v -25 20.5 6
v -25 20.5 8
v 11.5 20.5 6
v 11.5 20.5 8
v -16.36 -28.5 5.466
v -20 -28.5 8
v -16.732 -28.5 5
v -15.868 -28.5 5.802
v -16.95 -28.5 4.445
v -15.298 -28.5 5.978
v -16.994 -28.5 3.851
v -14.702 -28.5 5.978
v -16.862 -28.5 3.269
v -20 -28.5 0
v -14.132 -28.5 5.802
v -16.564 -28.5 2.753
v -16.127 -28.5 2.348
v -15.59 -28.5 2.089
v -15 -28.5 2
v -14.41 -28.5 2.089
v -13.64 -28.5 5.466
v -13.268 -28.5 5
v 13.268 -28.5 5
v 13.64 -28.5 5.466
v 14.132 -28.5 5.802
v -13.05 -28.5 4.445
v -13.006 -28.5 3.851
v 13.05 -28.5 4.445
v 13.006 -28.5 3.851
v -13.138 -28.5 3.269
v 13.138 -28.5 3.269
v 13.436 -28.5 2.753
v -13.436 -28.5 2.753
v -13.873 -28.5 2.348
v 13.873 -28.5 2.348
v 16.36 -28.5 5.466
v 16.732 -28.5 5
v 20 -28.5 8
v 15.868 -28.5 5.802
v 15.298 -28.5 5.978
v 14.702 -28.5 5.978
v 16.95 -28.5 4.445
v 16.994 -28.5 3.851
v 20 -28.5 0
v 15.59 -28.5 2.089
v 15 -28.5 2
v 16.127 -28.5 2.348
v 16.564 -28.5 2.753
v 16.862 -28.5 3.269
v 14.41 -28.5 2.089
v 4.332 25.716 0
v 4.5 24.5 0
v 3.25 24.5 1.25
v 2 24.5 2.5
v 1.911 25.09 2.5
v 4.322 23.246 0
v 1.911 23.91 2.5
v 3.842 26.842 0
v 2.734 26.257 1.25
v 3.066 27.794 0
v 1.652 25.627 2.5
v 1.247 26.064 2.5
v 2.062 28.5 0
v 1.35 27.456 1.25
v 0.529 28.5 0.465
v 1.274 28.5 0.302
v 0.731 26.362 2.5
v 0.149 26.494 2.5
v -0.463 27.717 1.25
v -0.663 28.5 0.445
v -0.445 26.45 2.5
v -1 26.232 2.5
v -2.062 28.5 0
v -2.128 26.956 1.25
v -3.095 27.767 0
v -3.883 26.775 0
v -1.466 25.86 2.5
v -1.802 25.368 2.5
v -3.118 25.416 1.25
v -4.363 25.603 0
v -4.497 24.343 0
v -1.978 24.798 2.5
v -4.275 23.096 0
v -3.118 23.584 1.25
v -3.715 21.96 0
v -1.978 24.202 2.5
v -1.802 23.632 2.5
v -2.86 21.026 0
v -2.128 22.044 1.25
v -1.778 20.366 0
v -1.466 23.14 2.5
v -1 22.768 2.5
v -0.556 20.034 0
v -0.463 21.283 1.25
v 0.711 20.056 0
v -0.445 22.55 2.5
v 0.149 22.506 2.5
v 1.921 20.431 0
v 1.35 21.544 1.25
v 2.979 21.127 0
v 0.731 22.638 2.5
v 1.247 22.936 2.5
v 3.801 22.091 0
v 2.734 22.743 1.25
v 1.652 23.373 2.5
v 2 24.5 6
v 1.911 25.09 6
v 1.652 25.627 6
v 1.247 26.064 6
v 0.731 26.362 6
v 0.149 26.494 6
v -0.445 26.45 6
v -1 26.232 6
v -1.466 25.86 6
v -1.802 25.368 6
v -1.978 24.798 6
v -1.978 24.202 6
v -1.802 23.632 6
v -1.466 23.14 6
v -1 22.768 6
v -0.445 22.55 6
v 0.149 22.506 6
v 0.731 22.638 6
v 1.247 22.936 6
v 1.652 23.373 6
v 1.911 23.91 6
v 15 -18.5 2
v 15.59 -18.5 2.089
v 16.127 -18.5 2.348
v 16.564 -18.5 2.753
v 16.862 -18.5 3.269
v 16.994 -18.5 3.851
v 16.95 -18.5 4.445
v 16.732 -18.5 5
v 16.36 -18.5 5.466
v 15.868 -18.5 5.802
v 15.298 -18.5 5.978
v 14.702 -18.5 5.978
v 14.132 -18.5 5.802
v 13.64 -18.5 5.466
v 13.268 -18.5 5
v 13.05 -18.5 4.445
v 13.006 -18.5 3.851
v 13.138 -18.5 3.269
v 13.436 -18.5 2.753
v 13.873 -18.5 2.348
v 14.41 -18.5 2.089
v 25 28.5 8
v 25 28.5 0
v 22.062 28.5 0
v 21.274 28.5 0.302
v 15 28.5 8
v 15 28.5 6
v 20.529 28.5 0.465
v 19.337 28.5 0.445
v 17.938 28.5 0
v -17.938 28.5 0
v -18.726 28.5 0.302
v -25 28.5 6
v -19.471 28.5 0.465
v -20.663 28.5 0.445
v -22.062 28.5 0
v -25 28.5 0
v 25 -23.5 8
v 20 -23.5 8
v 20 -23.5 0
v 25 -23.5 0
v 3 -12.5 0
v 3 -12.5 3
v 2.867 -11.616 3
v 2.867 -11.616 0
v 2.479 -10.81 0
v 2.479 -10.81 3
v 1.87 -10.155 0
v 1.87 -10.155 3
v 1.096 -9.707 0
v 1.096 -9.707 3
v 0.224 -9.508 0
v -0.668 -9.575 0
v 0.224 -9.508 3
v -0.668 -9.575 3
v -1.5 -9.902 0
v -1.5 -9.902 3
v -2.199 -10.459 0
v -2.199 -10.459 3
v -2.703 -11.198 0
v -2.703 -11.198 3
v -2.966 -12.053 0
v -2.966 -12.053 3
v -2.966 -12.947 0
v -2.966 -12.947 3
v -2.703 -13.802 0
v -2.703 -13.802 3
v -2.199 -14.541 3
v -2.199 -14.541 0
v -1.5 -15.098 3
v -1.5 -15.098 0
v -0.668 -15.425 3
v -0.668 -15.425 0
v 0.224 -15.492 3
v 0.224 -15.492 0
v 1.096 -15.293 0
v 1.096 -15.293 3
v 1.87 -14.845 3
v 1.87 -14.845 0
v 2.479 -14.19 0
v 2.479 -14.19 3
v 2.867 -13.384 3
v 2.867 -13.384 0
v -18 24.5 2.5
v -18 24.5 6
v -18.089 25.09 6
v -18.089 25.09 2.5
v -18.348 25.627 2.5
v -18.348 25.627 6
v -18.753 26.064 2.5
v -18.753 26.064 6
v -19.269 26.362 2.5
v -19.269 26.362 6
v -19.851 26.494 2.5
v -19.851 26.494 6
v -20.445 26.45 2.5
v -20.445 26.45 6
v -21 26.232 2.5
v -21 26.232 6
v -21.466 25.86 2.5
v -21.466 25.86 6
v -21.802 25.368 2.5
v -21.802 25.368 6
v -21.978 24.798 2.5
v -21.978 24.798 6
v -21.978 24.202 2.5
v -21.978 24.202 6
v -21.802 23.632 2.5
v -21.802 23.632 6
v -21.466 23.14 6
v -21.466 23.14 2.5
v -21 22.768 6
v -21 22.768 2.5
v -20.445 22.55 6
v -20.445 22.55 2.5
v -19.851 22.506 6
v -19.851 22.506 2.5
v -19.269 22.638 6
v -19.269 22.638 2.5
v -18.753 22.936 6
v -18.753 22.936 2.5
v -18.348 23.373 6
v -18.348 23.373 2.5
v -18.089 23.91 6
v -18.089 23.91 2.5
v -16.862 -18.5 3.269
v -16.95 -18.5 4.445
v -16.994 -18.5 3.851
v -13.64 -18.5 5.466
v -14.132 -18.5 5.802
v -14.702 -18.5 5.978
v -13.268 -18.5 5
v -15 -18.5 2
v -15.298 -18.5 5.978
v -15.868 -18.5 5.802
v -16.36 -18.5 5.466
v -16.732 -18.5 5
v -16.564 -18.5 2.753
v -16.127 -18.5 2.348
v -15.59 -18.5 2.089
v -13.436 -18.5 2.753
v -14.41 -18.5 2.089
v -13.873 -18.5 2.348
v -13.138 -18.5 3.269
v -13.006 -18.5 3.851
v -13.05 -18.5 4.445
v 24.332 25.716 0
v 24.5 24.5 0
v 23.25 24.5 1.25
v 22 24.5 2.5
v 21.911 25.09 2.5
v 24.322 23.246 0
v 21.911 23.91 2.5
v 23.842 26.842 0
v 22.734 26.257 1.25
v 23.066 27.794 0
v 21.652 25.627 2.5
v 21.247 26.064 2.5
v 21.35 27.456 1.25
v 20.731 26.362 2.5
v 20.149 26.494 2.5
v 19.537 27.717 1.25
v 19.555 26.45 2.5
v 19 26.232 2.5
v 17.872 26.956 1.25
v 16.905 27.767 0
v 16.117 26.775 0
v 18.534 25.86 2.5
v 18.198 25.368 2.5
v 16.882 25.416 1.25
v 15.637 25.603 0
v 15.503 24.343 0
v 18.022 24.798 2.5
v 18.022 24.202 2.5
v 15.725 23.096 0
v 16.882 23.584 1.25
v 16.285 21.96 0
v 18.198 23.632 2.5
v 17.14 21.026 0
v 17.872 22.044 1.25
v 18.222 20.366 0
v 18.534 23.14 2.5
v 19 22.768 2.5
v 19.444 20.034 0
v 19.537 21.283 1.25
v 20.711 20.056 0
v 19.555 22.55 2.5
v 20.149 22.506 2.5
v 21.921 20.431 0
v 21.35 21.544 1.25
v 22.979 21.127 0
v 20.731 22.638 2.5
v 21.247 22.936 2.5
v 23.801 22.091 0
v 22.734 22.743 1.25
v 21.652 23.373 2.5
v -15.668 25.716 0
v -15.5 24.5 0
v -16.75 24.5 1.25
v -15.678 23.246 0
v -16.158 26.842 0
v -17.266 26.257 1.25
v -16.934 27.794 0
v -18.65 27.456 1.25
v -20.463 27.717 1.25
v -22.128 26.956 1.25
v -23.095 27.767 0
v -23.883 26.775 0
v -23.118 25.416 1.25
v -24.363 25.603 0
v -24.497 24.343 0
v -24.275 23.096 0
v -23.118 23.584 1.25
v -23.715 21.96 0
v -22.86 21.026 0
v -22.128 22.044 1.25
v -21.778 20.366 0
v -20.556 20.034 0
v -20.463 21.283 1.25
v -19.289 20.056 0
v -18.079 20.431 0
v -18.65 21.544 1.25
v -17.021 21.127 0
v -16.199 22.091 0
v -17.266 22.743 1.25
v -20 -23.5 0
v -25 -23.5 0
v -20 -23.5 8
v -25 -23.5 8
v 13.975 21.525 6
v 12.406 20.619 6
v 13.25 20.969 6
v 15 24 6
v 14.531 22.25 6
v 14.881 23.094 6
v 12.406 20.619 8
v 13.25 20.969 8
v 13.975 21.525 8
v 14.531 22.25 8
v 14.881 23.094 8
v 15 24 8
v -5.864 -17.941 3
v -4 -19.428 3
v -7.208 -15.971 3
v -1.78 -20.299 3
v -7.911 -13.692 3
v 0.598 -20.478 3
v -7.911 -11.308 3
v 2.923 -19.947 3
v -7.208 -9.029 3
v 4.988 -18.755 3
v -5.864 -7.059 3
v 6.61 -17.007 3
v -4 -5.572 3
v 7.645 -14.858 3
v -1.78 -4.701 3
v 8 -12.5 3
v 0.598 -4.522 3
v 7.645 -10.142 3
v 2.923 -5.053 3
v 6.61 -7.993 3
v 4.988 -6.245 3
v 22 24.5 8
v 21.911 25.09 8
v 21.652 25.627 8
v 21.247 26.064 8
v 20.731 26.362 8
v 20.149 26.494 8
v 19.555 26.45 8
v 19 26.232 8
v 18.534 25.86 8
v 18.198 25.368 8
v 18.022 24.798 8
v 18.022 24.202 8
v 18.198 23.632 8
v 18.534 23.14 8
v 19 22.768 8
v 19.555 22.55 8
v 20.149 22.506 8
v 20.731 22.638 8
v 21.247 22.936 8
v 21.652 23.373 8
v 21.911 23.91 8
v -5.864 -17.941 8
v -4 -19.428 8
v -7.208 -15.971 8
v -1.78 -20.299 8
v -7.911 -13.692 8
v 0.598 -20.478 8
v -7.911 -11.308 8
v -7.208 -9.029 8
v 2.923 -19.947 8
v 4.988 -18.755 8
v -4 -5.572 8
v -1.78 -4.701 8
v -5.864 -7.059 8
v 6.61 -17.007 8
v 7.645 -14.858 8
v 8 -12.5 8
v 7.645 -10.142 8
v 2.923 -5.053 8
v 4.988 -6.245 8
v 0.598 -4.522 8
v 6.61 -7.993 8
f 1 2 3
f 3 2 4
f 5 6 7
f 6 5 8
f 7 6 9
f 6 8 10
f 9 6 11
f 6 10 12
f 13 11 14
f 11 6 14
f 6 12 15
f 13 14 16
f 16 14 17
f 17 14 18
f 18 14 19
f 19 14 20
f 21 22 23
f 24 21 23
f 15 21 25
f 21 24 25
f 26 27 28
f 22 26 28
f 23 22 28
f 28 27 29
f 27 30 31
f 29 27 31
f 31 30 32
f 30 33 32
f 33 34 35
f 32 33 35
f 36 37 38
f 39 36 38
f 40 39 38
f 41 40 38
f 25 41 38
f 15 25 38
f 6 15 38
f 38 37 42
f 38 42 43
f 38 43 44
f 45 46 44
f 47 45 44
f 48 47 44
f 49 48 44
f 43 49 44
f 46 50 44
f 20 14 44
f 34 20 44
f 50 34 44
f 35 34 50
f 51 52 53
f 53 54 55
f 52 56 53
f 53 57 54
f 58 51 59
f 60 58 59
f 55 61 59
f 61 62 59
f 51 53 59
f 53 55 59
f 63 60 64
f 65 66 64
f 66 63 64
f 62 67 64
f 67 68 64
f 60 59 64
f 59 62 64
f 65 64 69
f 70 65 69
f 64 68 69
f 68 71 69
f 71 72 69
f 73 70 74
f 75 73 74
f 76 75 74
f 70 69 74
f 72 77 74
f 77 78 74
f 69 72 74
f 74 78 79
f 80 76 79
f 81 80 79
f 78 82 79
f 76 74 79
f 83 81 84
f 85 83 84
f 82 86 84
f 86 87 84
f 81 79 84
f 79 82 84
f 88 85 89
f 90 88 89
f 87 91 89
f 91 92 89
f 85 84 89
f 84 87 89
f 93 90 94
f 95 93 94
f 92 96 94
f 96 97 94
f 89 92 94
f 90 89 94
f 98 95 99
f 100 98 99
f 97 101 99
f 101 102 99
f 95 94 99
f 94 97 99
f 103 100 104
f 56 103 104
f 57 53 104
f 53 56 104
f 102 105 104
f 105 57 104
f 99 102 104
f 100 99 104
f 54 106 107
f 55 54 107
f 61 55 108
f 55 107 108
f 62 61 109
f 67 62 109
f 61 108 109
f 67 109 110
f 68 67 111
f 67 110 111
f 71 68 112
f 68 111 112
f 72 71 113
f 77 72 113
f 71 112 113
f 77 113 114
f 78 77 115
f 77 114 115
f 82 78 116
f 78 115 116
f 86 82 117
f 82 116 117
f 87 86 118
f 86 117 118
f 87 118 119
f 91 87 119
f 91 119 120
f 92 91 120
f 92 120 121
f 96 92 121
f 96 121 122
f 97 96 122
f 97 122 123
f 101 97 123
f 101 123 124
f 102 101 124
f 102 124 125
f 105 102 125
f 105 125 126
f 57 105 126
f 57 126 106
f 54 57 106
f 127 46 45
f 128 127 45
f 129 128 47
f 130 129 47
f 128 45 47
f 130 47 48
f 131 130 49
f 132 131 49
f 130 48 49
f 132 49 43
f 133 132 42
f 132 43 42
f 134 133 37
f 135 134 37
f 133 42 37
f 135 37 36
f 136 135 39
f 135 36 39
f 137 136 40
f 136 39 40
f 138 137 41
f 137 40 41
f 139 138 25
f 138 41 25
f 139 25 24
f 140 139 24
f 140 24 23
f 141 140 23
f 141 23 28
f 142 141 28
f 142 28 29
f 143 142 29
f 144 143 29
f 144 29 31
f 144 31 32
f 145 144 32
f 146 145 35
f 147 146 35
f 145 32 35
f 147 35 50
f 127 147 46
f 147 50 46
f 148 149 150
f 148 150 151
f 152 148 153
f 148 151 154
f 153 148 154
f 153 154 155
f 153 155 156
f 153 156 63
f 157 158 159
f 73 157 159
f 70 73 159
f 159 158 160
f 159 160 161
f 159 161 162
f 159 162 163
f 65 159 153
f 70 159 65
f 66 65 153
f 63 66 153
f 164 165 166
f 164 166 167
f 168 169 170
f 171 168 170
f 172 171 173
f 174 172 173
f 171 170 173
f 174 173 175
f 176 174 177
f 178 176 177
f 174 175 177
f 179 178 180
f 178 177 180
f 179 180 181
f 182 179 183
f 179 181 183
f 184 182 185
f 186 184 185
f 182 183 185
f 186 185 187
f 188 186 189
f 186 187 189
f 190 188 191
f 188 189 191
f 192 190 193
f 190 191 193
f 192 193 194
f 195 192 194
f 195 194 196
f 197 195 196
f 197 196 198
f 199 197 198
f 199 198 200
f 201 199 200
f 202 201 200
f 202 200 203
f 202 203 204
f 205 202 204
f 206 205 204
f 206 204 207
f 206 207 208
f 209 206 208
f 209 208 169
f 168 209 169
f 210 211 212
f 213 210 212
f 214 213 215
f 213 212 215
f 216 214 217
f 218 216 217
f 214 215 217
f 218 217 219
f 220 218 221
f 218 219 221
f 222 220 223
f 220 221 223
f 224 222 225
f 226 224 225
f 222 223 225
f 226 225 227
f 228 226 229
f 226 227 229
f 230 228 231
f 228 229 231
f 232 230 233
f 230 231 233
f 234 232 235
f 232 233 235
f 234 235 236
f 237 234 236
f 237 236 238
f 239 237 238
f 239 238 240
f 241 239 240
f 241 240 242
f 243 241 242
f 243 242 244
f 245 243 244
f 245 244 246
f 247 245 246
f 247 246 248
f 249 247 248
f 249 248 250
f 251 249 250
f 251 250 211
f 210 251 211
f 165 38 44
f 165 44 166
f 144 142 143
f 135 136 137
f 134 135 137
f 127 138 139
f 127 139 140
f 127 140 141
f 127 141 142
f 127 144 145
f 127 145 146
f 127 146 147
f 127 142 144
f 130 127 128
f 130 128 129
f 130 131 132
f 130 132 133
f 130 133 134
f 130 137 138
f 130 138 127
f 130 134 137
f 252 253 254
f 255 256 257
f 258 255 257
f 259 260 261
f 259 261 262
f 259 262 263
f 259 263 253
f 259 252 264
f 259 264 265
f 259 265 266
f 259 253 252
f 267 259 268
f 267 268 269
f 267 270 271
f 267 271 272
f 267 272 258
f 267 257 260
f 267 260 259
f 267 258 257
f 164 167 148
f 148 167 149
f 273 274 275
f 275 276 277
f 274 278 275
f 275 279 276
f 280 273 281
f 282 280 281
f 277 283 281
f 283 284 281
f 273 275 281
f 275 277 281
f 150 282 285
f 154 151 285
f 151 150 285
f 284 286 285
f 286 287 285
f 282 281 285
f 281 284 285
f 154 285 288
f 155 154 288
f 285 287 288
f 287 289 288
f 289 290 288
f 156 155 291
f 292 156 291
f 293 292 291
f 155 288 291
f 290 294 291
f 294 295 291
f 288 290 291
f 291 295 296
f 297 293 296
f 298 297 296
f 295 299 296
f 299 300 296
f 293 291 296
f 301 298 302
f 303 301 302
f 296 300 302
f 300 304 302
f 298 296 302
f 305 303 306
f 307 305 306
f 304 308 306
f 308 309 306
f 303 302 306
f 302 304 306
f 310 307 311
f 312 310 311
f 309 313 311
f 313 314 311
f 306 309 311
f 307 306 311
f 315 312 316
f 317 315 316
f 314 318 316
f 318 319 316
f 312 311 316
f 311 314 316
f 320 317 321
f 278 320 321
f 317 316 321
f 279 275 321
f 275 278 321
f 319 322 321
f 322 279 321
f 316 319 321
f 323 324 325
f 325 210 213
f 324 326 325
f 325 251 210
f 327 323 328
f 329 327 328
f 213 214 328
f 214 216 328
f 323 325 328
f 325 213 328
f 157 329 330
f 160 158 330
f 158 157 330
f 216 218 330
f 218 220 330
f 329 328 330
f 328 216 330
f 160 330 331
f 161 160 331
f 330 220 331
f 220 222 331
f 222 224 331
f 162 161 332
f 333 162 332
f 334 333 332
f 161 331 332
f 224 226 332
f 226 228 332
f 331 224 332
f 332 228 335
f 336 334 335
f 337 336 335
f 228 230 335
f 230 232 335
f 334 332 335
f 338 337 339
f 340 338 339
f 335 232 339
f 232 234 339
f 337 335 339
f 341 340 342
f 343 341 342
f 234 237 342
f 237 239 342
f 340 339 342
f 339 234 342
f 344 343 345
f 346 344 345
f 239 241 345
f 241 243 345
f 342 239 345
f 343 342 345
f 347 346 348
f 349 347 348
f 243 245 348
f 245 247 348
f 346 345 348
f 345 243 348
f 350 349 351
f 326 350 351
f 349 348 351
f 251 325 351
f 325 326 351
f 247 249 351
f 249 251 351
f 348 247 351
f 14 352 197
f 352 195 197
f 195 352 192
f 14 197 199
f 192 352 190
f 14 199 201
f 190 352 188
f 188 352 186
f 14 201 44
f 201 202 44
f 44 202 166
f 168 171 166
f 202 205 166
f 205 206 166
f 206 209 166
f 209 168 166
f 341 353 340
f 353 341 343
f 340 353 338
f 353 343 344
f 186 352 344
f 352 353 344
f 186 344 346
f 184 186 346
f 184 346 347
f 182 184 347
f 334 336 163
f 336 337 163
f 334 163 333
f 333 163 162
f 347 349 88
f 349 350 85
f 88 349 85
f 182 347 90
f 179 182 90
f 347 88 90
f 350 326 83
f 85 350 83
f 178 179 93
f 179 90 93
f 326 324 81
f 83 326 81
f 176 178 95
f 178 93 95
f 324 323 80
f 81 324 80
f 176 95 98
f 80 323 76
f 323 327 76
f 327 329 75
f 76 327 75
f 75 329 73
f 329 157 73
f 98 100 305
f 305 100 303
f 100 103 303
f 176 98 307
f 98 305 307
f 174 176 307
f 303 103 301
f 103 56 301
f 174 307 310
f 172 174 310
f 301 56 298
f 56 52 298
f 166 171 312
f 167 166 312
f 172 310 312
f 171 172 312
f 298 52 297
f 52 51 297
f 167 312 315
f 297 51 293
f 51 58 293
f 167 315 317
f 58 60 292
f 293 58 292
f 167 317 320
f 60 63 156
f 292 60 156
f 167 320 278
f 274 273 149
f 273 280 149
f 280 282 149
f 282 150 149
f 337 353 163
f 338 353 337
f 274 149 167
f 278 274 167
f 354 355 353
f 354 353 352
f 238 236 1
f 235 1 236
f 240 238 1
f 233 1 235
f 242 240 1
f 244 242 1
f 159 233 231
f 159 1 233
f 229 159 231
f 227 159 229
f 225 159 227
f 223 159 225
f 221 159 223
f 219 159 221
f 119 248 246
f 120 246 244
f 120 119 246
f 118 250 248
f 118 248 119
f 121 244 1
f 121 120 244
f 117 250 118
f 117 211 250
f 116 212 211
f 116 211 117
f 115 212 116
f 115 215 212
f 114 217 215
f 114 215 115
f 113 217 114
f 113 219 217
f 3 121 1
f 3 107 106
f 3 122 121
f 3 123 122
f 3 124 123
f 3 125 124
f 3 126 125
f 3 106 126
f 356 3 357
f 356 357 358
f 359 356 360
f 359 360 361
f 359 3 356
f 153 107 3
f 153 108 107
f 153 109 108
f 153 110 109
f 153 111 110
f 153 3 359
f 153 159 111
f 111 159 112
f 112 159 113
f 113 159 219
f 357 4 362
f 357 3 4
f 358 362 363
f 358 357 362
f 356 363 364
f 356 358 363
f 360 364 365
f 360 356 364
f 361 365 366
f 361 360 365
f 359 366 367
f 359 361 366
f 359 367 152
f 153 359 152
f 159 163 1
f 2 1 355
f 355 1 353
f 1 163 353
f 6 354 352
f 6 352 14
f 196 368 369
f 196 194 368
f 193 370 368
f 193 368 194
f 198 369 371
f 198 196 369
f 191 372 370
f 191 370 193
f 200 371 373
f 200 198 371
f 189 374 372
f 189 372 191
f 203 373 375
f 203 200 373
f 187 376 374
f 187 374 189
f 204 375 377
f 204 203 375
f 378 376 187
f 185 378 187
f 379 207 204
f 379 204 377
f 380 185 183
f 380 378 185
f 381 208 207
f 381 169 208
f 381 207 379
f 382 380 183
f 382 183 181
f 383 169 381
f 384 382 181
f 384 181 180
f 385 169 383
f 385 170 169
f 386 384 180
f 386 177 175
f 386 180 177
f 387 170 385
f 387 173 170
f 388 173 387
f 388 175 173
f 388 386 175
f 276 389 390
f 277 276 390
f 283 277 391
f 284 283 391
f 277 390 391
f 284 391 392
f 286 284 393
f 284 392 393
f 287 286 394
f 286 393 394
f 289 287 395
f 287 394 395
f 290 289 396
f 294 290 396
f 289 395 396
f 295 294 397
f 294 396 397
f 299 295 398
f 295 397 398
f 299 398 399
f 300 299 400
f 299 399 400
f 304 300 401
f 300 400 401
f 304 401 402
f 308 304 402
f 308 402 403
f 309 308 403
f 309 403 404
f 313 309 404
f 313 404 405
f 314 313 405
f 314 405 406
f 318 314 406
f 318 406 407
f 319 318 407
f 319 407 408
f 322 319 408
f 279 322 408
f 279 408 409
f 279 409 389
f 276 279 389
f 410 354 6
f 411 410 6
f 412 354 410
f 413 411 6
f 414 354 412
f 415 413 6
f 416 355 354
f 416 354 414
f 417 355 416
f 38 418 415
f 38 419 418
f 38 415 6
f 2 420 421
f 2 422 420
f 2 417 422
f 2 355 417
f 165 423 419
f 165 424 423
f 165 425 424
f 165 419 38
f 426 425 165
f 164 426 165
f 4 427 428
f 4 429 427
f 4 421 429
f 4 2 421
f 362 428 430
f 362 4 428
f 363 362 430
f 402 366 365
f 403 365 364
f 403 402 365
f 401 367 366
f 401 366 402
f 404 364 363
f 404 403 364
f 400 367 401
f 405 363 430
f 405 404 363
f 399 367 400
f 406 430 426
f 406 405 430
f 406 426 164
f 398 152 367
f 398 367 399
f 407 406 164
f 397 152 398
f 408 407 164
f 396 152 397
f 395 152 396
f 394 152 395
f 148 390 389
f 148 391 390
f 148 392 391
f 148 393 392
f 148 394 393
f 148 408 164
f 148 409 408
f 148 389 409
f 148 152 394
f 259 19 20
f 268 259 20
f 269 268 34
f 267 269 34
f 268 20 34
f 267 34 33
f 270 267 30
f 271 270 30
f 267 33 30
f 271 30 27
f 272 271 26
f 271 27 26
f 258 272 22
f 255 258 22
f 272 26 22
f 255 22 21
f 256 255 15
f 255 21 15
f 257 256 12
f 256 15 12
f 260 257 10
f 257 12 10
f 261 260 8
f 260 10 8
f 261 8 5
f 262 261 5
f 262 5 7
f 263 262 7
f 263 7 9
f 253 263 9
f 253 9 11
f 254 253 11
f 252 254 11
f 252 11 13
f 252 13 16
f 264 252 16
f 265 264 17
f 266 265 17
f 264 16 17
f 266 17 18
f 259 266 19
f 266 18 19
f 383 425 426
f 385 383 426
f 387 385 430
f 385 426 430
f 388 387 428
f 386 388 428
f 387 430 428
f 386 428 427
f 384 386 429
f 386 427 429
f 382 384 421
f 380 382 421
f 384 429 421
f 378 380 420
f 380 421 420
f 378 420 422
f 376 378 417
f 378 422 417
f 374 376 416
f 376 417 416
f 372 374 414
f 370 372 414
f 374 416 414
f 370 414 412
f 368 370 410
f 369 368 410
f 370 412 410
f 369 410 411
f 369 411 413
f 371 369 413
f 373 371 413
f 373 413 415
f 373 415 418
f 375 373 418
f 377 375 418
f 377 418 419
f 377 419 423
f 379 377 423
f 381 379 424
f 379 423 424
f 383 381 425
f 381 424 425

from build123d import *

# Parameters (mm, degrees)
BOSS_EXTRU_1_DEPTH      = 8
ESQUISSE2_R             = 2
ENL_V_MAT_EXTRU_1_DEPTH = 10
ESQUISSE3_R             = 2
ENL_V_MAT_EXTRU_2_DEPTH = 39.745967532
CHANFREIN1_SIZE         = 2.5
ESQUISSE4_R             = 8
ENL_V_MAT_EXTRU_3_DEPTH = 5
ESQUISSE5_R             = 3
ENL_V_MAT_EXTRU_4_DEPTH = 39.23937761
ESQUISSE6_W             = 40
ESQUISSE6_H             = 8
ENL_V_MAT_EXTRU_5_DEPTH = 2
CONG_1_R                = 3.5


with BuildPart() as part:
    # Esquisse1 → Boss.-Extru.1 (new body)
    with BuildSketch(Plane.XY):
        Polygon((-25, -23.5), (-20, -23.5), (-20, -28.5), (20, -28.5), (20, -23.5), (25, -23.5), (25, 28.5), (-25, 28.5), align=None)
    extrude(amount=BOSS_EXTRU_1_DEPTH)

    # Esquisse2 → Enlèv. mat.-Extru.1 (cut)
    with BuildSketch(Plane.XZ.offset(28.5)):
        with Locations(Location((-15, 4, 0), (0, 0, 270))):
            Circle(ESQUISSE2_R)
        with Locations(Location((15, 4, 0), (0, 0, 270))):
            Circle(ESQUISSE2_R)
    extrude(amount=-ENL_V_MAT_EXTRU_1_DEPTH, mode=Mode.SUBTRACT)

    # Esquisse3 → Enlèv. mat.-Extru.2 (cut, through all)
    with BuildSketch(Plane.XY.offset(8)):
        with Locations((-20, 24.5)):
            Circle(ESQUISSE3_R)
        with Locations((20, 24.5)):
            Circle(ESQUISSE3_R)
        with Locations((0, 24.5)):
            Circle(ESQUISSE3_R)
    extrude(amount=-ENL_V_MAT_EXTRU_2_DEPTH, mode=Mode.SUBTRACT)

    # Chanfrein1
    # the kernel refuses this chamfer: 2.5 mm, written as the material it takes off along each edge
    with BuildSketch(Plane(origin=(-20, 24.5, 0), x_dir=(1, 0, 0), z_dir=(0, -1, 0))) as chanfrein1_piece_1:
        Polygon((2 + CHANFREIN1_SIZE, 0), (2, CHANFREIN1_SIZE), (2, 0), align=None)
    revolve(axis=Axis((-20, 24.5, 0), (0, 0, 1)), mode=Mode.SUBTRACT)
    with BuildSketch(Plane(origin=(20, 24.5, 0), x_dir=(1, 0, 0), z_dir=(0, -1, 0))) as chanfrein1_piece_2:
        Polygon((2 + CHANFREIN1_SIZE, 0), (2, CHANFREIN1_SIZE), (2, 0), align=None)
    revolve(axis=Axis((20, 24.5, 0), (0, 0, 1)), mode=Mode.SUBTRACT)
    with BuildSketch(Plane(origin=(0, 24.5, 0), x_dir=(1, 0, 0), z_dir=(0, -1, 0))) as chanfrein1_piece_3:
        Polygon((2 + CHANFREIN1_SIZE, 0), (2, CHANFREIN1_SIZE), (2, 0), align=None)
    revolve(axis=Axis((0, 24.5, 0), (0, 0, 1)), mode=Mode.SUBTRACT)

    # Esquisse4 → Enlèv. mat.-Extru.3 (cut)
    with BuildSketch(Plane.XY.offset(8)):
        with Locations((0, -12.5)):
            Circle(ESQUISSE4_R)
    extrude(amount=-ENL_V_MAT_EXTRU_3_DEPTH, mode=Mode.SUBTRACT)

    # Esquisse5 → Enlèv. mat.-Extru.4 (cut, through all)
    with BuildSketch(Plane.XY.offset(3)):
        with Locations((0, -12.5)):
            Circle(ESQUISSE5_R)
    extrude(amount=-ENL_V_MAT_EXTRU_4_DEPTH, mode=Mode.SUBTRACT)

    # Esquisse6 → Enlèv. mat.-Extru.5 (cut)
    with BuildSketch(Plane.XY.offset(8)):
        with Locations((-5, 24.5)):
            Rectangle(ESQUISSE6_W, ESQUISSE6_H)
    extrude(amount=-ENL_V_MAT_EXTRU_5_DEPTH, mode=Mode.SUBTRACT)

    # Congé1
    cong_1_edges = [part.edges().sort_by_distance(p)[0] for p in [
        (15, 20.5, 7),
    ]]
    fillet(cong_1_edges, radius=CONG_1_R)


solid = part.part
